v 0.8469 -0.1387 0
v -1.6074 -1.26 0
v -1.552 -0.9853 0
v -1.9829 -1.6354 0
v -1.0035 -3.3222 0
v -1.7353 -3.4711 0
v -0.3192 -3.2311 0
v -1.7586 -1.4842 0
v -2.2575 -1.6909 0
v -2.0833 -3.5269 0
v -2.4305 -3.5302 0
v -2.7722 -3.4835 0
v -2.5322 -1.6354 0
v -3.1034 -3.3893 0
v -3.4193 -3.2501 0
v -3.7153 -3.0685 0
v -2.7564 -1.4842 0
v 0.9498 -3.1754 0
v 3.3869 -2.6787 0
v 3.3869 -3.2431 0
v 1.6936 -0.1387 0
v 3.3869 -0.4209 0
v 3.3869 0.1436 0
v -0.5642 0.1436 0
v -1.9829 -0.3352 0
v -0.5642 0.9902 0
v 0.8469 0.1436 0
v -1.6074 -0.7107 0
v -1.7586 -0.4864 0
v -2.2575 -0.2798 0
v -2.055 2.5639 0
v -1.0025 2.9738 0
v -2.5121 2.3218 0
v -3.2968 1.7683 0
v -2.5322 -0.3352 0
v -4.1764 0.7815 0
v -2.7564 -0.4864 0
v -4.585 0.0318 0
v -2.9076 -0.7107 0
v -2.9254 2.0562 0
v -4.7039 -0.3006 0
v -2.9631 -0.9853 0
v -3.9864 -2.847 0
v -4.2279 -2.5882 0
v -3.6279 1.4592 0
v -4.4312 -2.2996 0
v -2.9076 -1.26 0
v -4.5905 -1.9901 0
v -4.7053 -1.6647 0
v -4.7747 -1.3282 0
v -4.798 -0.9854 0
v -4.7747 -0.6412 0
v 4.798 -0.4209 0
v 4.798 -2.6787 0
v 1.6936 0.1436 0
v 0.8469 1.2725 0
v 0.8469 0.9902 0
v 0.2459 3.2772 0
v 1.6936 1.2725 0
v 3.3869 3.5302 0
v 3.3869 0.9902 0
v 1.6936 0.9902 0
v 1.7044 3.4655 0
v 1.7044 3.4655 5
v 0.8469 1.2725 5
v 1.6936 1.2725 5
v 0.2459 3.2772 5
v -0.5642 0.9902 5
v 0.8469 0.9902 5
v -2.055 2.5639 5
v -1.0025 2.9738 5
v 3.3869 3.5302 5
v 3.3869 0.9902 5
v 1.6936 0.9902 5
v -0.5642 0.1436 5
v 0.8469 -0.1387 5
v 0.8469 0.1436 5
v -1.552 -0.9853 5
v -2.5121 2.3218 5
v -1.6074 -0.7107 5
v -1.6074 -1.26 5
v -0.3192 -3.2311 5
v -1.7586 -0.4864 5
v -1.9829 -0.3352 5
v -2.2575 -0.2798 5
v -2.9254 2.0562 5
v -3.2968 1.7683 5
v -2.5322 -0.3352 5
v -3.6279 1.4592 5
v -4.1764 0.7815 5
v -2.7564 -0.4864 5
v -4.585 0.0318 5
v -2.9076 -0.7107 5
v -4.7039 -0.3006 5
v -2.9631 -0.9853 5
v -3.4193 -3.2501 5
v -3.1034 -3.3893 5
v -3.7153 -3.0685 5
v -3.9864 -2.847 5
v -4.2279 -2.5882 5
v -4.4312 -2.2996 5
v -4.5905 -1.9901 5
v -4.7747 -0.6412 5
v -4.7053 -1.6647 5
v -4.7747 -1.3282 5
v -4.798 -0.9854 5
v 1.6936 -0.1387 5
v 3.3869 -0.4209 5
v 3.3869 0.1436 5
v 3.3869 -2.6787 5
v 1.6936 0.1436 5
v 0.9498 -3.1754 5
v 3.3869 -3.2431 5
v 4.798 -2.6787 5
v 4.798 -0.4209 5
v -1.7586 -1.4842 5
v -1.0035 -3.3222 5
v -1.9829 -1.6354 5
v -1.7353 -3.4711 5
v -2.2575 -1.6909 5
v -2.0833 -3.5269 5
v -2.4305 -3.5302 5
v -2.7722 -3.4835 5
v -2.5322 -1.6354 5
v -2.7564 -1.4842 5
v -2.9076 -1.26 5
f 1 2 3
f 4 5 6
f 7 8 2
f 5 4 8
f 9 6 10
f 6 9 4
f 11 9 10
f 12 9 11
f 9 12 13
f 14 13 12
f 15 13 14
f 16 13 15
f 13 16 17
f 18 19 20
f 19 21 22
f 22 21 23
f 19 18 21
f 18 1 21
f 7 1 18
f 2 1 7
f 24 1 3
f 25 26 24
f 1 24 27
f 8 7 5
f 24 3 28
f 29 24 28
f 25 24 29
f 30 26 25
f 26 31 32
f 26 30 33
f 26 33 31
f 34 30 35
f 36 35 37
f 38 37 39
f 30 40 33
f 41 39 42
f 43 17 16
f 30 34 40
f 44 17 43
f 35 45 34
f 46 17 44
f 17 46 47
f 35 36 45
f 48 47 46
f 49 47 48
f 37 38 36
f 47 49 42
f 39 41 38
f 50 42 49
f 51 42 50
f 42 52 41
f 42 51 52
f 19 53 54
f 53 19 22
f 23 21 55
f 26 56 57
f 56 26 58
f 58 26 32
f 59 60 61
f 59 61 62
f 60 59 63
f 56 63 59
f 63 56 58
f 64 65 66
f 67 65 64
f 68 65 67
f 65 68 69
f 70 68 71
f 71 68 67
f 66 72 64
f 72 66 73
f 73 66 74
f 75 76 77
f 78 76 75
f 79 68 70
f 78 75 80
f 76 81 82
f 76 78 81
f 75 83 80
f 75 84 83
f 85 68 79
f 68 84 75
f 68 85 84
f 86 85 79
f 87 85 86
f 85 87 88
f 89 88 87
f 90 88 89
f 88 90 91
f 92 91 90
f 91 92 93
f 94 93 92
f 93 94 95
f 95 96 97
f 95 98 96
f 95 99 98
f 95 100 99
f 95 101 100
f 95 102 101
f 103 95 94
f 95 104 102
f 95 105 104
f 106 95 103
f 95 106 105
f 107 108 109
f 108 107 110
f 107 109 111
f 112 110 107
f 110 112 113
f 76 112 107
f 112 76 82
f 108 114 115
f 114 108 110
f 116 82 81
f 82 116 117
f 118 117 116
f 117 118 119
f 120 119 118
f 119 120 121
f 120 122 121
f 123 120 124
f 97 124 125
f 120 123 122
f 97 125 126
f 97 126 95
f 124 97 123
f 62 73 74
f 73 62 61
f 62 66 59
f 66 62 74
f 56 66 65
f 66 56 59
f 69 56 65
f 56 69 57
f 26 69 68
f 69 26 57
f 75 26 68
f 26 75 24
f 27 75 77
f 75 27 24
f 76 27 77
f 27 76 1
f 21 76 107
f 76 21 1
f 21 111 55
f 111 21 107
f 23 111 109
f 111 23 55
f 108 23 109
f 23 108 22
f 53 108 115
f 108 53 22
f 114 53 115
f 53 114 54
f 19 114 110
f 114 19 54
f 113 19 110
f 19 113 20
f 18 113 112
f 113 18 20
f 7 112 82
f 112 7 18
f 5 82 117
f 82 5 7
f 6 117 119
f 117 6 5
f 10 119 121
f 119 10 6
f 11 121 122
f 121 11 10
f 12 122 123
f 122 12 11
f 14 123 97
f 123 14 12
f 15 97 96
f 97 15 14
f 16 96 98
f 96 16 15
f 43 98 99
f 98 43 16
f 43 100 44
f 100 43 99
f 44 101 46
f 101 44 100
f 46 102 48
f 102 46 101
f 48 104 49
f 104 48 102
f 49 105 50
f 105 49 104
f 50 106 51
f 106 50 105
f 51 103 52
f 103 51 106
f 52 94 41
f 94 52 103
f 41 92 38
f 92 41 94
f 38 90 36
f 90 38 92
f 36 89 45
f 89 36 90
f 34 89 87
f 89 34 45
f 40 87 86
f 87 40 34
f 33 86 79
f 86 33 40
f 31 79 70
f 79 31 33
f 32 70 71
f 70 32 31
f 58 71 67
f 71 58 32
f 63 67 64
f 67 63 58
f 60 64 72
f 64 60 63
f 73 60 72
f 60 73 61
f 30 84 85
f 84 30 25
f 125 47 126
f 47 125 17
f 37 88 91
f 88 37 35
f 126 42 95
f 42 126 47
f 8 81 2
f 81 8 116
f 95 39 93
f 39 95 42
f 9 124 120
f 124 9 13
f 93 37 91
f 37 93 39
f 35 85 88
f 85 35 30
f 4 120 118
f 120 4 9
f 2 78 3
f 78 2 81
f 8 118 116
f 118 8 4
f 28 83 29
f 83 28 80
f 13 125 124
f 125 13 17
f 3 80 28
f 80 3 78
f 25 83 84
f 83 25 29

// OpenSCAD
// Module names are of the form poly_<inkscape-path-id>().  As a result,
// you can associate a polygon in this OpenSCAD program with the corresponding
// SVG element in the Inkscape document by looking for the XML element with
// the attribute id="inkscape-path-id".

// fudge value is used to ensure that subtracted solids are a tad taller
// in the z dimension than the polygon being subtracted from.  This helps
// keep the resulting .stl file manifold.
fudge = 0.1;

module poly_path4149(h)
{
  scale([25.4/90, -25.4/90, 1]) union()
  {
    difference()
    {
       linear_extrude(height=h)
         polygon([[-14.980675,9.170943],[-14.125093,10.087945],[-13.164453,10.872662],[-12.115798,11.516096],[-10.996169,12.009246],[-9.822610,12.343113],[-8.612164,12.508700],[-7.381873,12.497006],[-6.148779,12.299033],[-3.555842,11.771471],[-1.130938,11.448630],[3.365558,11.251439],[12.000853,11.491303],[12.000853,9.491303],[17.000852,9.491303],[17.000852,1.491303],[12.000853,1.491303],[12.000853,-0.508697],[6.000853,-0.508697],[6.000853,0.491303],[3.000853,0.491303],[3.000853,-0.508697],[-1.999148,-0.508697],[-1.999148,-3.508697],[3.000853,-3.508697],[3.000853,-4.508697],[6.000853,-4.508697],[6.000853,-3.508697],[12.000853,-3.508697],[12.000853,-12.508700],[6.039284,-12.279476],[0.871483,-11.612112],[-3.552188,-10.537067],[-7.281372,-9.084800],[-8.901043,-8.226728],[-10.365707,-7.285772],[-11.681570,-6.265741],[-12.854835,-5.170443],[-14.798396,-2.769271],[-16.246030,-0.112717],[-16.667302,1.064963],[-16.918087,2.272144],[-17.000852,3.491613],[-16.918062,4.706162],[-16.672183,5.898579],[-16.265682,7.051656],[-15.701024,8.148180],[-14.980675,9.170943]]);
       translate([0, 0, -fudge])
         linear_extrude(height=h+2*fudge)
           polygon([[-5.499148,3.491303],[-5.695610,4.464415],[-6.231381,5.259069],[-7.026035,5.794840],[-7.999148,5.991303],[-8.972261,5.794840],[-9.766915,5.259069],[-10.302686,4.464415],[-10.499148,3.491303],[-10.302686,2.518191],[-9.766915,1.723537],[-8.972261,1.187766],[-7.999148,0.991303],[-7.026035,1.187766],[-6.231381,1.723537],[-5.695610,2.518191],[-5.499148,3.491303]]);
    }
  }
}

poly_path4149(5);
